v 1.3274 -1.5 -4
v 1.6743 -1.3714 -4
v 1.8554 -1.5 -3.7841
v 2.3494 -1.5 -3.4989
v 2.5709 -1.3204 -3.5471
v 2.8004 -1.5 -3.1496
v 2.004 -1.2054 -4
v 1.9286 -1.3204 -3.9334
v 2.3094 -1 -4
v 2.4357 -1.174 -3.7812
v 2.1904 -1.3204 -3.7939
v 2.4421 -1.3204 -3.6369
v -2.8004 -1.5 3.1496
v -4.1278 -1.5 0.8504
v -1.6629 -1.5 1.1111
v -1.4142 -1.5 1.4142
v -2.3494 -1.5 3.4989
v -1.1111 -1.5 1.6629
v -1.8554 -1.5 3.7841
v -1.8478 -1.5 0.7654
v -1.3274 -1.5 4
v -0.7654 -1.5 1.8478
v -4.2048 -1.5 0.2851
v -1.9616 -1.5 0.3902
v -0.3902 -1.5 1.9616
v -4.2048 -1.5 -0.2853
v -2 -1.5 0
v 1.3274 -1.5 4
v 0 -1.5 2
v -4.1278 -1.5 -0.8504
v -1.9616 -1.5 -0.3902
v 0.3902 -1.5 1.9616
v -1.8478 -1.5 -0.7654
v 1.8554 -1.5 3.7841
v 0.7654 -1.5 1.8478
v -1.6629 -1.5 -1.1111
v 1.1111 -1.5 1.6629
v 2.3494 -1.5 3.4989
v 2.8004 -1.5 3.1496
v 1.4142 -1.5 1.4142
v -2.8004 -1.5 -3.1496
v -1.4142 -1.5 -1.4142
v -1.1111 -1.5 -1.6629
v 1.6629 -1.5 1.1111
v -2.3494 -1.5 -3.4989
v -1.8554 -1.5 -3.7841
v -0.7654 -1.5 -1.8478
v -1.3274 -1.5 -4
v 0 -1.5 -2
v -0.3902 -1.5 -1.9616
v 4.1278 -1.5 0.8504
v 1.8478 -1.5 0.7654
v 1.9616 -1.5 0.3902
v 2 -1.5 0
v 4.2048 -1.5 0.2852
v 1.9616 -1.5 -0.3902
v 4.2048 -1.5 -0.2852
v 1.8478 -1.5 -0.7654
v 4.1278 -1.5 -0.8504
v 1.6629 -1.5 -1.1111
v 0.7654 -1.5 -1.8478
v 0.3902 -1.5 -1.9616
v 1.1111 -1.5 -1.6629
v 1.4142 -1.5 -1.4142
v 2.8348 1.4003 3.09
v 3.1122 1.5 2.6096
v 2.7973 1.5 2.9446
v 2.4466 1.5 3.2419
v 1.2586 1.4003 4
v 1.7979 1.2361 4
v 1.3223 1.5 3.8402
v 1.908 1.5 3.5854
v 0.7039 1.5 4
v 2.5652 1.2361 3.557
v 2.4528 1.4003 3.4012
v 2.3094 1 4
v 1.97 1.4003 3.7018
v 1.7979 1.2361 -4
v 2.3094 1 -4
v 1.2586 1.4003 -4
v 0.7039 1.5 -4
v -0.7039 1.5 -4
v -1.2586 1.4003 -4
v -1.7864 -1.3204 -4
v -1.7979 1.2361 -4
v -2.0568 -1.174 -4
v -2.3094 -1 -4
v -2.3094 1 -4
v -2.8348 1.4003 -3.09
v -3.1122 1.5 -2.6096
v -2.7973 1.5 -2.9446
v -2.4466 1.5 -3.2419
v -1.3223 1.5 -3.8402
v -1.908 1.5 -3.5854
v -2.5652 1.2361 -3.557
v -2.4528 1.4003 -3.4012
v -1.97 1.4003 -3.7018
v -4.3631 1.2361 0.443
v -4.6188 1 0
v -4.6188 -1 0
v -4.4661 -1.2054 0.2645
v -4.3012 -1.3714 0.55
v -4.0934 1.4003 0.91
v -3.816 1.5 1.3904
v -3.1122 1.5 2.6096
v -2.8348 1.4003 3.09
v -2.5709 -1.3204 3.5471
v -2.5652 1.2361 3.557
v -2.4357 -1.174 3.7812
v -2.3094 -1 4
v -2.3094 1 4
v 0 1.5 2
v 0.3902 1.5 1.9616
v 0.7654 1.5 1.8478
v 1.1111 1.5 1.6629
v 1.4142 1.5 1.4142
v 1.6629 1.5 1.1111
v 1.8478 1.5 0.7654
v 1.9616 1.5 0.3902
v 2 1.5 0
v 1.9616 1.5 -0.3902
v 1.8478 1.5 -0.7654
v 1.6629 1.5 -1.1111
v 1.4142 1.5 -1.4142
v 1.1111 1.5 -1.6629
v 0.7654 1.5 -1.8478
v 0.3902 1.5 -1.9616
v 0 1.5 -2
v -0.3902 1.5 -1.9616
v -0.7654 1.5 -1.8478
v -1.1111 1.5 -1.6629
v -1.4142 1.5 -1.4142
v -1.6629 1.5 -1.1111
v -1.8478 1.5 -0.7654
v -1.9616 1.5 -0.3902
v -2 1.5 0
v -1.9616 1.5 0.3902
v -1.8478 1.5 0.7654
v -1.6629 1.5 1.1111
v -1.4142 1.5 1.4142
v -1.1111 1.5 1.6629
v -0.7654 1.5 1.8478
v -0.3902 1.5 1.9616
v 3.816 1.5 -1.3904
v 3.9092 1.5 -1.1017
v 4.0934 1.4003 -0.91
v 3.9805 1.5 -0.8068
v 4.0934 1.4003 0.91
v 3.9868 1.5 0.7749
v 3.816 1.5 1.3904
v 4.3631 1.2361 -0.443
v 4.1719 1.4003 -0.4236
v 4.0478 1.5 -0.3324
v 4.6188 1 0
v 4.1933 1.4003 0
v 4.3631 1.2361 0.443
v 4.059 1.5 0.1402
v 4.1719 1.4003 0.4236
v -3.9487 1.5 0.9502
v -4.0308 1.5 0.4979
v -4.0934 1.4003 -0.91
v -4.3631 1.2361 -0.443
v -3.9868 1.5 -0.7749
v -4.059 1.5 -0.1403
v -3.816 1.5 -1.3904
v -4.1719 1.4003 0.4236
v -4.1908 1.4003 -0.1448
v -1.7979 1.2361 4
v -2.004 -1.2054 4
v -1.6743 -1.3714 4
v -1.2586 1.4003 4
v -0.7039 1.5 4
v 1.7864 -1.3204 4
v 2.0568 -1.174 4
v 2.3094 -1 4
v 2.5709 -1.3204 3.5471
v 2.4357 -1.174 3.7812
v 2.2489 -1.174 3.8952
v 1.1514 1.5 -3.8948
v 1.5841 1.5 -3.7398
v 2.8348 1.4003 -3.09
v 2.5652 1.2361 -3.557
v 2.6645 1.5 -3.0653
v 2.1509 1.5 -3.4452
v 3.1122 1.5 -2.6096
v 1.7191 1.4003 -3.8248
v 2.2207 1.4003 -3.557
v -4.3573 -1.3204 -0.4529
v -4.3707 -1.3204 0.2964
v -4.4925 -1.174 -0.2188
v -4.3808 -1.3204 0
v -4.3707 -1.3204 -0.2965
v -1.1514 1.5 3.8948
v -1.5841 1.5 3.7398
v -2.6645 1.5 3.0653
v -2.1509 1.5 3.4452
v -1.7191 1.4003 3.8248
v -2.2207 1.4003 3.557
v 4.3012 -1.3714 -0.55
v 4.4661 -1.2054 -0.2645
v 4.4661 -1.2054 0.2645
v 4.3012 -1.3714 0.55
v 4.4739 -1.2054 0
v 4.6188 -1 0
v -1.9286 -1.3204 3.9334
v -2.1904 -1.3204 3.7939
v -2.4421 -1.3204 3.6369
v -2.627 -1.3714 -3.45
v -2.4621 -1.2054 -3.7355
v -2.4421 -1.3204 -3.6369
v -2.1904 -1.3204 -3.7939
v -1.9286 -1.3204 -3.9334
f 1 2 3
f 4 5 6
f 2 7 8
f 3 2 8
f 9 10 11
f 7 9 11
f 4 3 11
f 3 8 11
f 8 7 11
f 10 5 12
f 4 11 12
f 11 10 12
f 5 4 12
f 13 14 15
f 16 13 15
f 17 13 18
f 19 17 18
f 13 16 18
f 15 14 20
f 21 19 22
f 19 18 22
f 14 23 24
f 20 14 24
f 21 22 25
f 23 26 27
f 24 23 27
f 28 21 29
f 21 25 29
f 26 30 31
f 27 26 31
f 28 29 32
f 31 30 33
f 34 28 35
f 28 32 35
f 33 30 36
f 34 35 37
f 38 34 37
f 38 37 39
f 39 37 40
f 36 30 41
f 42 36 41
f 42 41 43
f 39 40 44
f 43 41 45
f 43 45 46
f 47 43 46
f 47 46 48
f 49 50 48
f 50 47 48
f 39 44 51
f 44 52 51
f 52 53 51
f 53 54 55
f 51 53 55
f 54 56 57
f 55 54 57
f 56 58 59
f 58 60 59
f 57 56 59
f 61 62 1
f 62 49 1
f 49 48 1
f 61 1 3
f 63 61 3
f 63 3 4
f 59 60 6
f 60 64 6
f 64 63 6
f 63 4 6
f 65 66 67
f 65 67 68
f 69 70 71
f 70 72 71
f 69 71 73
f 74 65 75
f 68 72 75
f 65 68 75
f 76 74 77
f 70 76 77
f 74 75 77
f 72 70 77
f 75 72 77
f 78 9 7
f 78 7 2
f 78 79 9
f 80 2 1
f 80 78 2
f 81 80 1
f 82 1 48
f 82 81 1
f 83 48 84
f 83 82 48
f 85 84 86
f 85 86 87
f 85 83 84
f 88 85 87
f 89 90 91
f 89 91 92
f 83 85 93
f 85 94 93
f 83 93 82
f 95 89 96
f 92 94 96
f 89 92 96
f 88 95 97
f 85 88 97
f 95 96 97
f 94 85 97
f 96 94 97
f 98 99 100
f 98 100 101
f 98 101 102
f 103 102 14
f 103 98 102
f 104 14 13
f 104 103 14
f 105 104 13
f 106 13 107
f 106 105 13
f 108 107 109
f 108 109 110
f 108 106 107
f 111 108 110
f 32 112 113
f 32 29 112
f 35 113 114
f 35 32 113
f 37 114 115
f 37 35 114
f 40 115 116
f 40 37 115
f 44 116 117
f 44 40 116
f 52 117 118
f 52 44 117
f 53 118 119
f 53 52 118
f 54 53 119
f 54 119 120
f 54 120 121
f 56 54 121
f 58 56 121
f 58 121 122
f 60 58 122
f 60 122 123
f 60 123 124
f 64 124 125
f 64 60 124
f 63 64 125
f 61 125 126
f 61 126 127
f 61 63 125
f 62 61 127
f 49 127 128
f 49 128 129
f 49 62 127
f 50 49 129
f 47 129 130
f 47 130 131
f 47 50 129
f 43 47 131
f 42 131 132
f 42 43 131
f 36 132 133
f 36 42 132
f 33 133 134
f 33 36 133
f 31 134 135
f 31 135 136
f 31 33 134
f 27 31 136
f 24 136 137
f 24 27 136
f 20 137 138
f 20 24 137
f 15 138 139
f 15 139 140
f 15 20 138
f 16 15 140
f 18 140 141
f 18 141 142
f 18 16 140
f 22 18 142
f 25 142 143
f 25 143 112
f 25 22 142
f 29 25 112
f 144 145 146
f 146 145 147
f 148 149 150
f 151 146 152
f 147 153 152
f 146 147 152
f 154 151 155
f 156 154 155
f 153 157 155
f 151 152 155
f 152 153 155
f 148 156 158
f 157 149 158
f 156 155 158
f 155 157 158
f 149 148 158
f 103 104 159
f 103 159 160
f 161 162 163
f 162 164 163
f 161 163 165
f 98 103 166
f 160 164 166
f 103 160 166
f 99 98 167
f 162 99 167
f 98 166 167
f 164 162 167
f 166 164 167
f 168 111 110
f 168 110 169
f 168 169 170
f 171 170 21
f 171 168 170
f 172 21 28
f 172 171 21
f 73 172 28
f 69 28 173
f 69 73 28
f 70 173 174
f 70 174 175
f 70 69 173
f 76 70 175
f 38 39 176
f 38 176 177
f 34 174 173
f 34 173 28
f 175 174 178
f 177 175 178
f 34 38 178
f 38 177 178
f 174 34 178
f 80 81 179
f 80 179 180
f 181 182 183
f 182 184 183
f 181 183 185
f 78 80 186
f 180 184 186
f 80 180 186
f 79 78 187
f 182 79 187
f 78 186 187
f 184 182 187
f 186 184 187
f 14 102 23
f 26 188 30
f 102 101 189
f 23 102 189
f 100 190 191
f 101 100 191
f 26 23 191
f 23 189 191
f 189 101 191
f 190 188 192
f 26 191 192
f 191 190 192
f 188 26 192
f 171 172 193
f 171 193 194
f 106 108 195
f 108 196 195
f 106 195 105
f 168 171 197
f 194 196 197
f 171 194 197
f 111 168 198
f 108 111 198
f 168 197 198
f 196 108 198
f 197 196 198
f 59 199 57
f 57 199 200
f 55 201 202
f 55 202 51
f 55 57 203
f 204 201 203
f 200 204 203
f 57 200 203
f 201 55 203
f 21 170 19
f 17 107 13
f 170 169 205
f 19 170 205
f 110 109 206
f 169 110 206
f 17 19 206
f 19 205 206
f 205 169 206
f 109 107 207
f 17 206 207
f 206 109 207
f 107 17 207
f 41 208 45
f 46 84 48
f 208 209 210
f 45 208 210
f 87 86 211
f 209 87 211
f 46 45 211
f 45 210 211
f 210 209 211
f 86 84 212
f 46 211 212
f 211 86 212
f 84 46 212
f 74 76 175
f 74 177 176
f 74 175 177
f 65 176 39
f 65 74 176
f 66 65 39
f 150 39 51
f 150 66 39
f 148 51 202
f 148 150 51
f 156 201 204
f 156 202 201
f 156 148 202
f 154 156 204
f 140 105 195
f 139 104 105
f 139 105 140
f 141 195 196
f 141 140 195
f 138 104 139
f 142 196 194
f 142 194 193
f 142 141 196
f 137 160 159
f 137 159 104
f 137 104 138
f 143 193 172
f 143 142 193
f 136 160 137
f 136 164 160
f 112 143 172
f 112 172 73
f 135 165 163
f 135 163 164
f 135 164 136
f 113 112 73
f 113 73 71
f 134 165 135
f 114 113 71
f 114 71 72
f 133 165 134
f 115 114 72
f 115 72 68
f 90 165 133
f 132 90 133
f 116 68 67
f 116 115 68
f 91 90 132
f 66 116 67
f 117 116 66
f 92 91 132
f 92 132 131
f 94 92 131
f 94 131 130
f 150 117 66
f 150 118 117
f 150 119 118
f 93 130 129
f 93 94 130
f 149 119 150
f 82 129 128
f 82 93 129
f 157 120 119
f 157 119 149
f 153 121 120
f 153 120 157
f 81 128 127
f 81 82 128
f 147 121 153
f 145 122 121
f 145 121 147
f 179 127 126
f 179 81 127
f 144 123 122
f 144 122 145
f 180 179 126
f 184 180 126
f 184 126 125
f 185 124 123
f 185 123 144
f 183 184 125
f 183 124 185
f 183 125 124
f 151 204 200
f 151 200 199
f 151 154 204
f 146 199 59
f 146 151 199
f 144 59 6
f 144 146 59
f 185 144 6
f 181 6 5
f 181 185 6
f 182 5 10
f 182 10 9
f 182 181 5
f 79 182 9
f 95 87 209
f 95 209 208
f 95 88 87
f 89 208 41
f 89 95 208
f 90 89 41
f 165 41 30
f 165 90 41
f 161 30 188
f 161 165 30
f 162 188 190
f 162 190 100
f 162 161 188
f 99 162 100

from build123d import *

# Parameters (mm, degrees)
SKIZZE1_R                       = 2
AUFSATZ_LINEAR_AUSTRAGEN1_DEPTH = 1.5


with BuildPart() as part:
    # Skizze1 → Aufsatz-Linear austragen1 (new, symmetric)
    with BuildSketch(Plane(origin=(0, 0, 0), x_dir=(1, 0, 0), z_dir=(0, 1, 0))):
        Polygon((-2.309401077, 4), (-4.618802154, 0), (-2.309401077, -4), (2.309401077, -4), (4.618802154, 0), (2.309401077, 4), align=None)
        Circle(SKIZZE1_R, mode=Mode.SUBTRACT)
    extrude(amount=AUFSATZ_LINEAR_AUSTRAGEN1_DEPTH, both=True)

    # Skizze2 → Schnitt-Rotation1 (revolve, cut)
    with BuildSketch(Plane.XY):
        with BuildLine():
            Line((0, 1.5), (0, 2.733189598))
            Line((0, 2.733189598), (4.618802154, 2.733189598))
            Line((4.618802154, 2.733189598), (4.618802154, 1))
            ThreePointArc((4.618802154, 1), (2.405106227, 2.134086305), (0, 1.5))
        make_face()
        with BuildLine():
            Line((4.618802154, -1), (4.618802154, -2.751278334))
            Line((4.618802154, -2.751278334), (0, -2.751278334))
            Line((0, -2.751278334), (0, -1.5))
            ThreePointArc((0, -1.5), (2.428755218, -2.352546333), (4.618802154, -1))
        make_face()
    revolve(axis=Axis((0, 1.5, 0), (0, -1, 0)), mode=Mode.SUBTRACT)


solid = part.part
